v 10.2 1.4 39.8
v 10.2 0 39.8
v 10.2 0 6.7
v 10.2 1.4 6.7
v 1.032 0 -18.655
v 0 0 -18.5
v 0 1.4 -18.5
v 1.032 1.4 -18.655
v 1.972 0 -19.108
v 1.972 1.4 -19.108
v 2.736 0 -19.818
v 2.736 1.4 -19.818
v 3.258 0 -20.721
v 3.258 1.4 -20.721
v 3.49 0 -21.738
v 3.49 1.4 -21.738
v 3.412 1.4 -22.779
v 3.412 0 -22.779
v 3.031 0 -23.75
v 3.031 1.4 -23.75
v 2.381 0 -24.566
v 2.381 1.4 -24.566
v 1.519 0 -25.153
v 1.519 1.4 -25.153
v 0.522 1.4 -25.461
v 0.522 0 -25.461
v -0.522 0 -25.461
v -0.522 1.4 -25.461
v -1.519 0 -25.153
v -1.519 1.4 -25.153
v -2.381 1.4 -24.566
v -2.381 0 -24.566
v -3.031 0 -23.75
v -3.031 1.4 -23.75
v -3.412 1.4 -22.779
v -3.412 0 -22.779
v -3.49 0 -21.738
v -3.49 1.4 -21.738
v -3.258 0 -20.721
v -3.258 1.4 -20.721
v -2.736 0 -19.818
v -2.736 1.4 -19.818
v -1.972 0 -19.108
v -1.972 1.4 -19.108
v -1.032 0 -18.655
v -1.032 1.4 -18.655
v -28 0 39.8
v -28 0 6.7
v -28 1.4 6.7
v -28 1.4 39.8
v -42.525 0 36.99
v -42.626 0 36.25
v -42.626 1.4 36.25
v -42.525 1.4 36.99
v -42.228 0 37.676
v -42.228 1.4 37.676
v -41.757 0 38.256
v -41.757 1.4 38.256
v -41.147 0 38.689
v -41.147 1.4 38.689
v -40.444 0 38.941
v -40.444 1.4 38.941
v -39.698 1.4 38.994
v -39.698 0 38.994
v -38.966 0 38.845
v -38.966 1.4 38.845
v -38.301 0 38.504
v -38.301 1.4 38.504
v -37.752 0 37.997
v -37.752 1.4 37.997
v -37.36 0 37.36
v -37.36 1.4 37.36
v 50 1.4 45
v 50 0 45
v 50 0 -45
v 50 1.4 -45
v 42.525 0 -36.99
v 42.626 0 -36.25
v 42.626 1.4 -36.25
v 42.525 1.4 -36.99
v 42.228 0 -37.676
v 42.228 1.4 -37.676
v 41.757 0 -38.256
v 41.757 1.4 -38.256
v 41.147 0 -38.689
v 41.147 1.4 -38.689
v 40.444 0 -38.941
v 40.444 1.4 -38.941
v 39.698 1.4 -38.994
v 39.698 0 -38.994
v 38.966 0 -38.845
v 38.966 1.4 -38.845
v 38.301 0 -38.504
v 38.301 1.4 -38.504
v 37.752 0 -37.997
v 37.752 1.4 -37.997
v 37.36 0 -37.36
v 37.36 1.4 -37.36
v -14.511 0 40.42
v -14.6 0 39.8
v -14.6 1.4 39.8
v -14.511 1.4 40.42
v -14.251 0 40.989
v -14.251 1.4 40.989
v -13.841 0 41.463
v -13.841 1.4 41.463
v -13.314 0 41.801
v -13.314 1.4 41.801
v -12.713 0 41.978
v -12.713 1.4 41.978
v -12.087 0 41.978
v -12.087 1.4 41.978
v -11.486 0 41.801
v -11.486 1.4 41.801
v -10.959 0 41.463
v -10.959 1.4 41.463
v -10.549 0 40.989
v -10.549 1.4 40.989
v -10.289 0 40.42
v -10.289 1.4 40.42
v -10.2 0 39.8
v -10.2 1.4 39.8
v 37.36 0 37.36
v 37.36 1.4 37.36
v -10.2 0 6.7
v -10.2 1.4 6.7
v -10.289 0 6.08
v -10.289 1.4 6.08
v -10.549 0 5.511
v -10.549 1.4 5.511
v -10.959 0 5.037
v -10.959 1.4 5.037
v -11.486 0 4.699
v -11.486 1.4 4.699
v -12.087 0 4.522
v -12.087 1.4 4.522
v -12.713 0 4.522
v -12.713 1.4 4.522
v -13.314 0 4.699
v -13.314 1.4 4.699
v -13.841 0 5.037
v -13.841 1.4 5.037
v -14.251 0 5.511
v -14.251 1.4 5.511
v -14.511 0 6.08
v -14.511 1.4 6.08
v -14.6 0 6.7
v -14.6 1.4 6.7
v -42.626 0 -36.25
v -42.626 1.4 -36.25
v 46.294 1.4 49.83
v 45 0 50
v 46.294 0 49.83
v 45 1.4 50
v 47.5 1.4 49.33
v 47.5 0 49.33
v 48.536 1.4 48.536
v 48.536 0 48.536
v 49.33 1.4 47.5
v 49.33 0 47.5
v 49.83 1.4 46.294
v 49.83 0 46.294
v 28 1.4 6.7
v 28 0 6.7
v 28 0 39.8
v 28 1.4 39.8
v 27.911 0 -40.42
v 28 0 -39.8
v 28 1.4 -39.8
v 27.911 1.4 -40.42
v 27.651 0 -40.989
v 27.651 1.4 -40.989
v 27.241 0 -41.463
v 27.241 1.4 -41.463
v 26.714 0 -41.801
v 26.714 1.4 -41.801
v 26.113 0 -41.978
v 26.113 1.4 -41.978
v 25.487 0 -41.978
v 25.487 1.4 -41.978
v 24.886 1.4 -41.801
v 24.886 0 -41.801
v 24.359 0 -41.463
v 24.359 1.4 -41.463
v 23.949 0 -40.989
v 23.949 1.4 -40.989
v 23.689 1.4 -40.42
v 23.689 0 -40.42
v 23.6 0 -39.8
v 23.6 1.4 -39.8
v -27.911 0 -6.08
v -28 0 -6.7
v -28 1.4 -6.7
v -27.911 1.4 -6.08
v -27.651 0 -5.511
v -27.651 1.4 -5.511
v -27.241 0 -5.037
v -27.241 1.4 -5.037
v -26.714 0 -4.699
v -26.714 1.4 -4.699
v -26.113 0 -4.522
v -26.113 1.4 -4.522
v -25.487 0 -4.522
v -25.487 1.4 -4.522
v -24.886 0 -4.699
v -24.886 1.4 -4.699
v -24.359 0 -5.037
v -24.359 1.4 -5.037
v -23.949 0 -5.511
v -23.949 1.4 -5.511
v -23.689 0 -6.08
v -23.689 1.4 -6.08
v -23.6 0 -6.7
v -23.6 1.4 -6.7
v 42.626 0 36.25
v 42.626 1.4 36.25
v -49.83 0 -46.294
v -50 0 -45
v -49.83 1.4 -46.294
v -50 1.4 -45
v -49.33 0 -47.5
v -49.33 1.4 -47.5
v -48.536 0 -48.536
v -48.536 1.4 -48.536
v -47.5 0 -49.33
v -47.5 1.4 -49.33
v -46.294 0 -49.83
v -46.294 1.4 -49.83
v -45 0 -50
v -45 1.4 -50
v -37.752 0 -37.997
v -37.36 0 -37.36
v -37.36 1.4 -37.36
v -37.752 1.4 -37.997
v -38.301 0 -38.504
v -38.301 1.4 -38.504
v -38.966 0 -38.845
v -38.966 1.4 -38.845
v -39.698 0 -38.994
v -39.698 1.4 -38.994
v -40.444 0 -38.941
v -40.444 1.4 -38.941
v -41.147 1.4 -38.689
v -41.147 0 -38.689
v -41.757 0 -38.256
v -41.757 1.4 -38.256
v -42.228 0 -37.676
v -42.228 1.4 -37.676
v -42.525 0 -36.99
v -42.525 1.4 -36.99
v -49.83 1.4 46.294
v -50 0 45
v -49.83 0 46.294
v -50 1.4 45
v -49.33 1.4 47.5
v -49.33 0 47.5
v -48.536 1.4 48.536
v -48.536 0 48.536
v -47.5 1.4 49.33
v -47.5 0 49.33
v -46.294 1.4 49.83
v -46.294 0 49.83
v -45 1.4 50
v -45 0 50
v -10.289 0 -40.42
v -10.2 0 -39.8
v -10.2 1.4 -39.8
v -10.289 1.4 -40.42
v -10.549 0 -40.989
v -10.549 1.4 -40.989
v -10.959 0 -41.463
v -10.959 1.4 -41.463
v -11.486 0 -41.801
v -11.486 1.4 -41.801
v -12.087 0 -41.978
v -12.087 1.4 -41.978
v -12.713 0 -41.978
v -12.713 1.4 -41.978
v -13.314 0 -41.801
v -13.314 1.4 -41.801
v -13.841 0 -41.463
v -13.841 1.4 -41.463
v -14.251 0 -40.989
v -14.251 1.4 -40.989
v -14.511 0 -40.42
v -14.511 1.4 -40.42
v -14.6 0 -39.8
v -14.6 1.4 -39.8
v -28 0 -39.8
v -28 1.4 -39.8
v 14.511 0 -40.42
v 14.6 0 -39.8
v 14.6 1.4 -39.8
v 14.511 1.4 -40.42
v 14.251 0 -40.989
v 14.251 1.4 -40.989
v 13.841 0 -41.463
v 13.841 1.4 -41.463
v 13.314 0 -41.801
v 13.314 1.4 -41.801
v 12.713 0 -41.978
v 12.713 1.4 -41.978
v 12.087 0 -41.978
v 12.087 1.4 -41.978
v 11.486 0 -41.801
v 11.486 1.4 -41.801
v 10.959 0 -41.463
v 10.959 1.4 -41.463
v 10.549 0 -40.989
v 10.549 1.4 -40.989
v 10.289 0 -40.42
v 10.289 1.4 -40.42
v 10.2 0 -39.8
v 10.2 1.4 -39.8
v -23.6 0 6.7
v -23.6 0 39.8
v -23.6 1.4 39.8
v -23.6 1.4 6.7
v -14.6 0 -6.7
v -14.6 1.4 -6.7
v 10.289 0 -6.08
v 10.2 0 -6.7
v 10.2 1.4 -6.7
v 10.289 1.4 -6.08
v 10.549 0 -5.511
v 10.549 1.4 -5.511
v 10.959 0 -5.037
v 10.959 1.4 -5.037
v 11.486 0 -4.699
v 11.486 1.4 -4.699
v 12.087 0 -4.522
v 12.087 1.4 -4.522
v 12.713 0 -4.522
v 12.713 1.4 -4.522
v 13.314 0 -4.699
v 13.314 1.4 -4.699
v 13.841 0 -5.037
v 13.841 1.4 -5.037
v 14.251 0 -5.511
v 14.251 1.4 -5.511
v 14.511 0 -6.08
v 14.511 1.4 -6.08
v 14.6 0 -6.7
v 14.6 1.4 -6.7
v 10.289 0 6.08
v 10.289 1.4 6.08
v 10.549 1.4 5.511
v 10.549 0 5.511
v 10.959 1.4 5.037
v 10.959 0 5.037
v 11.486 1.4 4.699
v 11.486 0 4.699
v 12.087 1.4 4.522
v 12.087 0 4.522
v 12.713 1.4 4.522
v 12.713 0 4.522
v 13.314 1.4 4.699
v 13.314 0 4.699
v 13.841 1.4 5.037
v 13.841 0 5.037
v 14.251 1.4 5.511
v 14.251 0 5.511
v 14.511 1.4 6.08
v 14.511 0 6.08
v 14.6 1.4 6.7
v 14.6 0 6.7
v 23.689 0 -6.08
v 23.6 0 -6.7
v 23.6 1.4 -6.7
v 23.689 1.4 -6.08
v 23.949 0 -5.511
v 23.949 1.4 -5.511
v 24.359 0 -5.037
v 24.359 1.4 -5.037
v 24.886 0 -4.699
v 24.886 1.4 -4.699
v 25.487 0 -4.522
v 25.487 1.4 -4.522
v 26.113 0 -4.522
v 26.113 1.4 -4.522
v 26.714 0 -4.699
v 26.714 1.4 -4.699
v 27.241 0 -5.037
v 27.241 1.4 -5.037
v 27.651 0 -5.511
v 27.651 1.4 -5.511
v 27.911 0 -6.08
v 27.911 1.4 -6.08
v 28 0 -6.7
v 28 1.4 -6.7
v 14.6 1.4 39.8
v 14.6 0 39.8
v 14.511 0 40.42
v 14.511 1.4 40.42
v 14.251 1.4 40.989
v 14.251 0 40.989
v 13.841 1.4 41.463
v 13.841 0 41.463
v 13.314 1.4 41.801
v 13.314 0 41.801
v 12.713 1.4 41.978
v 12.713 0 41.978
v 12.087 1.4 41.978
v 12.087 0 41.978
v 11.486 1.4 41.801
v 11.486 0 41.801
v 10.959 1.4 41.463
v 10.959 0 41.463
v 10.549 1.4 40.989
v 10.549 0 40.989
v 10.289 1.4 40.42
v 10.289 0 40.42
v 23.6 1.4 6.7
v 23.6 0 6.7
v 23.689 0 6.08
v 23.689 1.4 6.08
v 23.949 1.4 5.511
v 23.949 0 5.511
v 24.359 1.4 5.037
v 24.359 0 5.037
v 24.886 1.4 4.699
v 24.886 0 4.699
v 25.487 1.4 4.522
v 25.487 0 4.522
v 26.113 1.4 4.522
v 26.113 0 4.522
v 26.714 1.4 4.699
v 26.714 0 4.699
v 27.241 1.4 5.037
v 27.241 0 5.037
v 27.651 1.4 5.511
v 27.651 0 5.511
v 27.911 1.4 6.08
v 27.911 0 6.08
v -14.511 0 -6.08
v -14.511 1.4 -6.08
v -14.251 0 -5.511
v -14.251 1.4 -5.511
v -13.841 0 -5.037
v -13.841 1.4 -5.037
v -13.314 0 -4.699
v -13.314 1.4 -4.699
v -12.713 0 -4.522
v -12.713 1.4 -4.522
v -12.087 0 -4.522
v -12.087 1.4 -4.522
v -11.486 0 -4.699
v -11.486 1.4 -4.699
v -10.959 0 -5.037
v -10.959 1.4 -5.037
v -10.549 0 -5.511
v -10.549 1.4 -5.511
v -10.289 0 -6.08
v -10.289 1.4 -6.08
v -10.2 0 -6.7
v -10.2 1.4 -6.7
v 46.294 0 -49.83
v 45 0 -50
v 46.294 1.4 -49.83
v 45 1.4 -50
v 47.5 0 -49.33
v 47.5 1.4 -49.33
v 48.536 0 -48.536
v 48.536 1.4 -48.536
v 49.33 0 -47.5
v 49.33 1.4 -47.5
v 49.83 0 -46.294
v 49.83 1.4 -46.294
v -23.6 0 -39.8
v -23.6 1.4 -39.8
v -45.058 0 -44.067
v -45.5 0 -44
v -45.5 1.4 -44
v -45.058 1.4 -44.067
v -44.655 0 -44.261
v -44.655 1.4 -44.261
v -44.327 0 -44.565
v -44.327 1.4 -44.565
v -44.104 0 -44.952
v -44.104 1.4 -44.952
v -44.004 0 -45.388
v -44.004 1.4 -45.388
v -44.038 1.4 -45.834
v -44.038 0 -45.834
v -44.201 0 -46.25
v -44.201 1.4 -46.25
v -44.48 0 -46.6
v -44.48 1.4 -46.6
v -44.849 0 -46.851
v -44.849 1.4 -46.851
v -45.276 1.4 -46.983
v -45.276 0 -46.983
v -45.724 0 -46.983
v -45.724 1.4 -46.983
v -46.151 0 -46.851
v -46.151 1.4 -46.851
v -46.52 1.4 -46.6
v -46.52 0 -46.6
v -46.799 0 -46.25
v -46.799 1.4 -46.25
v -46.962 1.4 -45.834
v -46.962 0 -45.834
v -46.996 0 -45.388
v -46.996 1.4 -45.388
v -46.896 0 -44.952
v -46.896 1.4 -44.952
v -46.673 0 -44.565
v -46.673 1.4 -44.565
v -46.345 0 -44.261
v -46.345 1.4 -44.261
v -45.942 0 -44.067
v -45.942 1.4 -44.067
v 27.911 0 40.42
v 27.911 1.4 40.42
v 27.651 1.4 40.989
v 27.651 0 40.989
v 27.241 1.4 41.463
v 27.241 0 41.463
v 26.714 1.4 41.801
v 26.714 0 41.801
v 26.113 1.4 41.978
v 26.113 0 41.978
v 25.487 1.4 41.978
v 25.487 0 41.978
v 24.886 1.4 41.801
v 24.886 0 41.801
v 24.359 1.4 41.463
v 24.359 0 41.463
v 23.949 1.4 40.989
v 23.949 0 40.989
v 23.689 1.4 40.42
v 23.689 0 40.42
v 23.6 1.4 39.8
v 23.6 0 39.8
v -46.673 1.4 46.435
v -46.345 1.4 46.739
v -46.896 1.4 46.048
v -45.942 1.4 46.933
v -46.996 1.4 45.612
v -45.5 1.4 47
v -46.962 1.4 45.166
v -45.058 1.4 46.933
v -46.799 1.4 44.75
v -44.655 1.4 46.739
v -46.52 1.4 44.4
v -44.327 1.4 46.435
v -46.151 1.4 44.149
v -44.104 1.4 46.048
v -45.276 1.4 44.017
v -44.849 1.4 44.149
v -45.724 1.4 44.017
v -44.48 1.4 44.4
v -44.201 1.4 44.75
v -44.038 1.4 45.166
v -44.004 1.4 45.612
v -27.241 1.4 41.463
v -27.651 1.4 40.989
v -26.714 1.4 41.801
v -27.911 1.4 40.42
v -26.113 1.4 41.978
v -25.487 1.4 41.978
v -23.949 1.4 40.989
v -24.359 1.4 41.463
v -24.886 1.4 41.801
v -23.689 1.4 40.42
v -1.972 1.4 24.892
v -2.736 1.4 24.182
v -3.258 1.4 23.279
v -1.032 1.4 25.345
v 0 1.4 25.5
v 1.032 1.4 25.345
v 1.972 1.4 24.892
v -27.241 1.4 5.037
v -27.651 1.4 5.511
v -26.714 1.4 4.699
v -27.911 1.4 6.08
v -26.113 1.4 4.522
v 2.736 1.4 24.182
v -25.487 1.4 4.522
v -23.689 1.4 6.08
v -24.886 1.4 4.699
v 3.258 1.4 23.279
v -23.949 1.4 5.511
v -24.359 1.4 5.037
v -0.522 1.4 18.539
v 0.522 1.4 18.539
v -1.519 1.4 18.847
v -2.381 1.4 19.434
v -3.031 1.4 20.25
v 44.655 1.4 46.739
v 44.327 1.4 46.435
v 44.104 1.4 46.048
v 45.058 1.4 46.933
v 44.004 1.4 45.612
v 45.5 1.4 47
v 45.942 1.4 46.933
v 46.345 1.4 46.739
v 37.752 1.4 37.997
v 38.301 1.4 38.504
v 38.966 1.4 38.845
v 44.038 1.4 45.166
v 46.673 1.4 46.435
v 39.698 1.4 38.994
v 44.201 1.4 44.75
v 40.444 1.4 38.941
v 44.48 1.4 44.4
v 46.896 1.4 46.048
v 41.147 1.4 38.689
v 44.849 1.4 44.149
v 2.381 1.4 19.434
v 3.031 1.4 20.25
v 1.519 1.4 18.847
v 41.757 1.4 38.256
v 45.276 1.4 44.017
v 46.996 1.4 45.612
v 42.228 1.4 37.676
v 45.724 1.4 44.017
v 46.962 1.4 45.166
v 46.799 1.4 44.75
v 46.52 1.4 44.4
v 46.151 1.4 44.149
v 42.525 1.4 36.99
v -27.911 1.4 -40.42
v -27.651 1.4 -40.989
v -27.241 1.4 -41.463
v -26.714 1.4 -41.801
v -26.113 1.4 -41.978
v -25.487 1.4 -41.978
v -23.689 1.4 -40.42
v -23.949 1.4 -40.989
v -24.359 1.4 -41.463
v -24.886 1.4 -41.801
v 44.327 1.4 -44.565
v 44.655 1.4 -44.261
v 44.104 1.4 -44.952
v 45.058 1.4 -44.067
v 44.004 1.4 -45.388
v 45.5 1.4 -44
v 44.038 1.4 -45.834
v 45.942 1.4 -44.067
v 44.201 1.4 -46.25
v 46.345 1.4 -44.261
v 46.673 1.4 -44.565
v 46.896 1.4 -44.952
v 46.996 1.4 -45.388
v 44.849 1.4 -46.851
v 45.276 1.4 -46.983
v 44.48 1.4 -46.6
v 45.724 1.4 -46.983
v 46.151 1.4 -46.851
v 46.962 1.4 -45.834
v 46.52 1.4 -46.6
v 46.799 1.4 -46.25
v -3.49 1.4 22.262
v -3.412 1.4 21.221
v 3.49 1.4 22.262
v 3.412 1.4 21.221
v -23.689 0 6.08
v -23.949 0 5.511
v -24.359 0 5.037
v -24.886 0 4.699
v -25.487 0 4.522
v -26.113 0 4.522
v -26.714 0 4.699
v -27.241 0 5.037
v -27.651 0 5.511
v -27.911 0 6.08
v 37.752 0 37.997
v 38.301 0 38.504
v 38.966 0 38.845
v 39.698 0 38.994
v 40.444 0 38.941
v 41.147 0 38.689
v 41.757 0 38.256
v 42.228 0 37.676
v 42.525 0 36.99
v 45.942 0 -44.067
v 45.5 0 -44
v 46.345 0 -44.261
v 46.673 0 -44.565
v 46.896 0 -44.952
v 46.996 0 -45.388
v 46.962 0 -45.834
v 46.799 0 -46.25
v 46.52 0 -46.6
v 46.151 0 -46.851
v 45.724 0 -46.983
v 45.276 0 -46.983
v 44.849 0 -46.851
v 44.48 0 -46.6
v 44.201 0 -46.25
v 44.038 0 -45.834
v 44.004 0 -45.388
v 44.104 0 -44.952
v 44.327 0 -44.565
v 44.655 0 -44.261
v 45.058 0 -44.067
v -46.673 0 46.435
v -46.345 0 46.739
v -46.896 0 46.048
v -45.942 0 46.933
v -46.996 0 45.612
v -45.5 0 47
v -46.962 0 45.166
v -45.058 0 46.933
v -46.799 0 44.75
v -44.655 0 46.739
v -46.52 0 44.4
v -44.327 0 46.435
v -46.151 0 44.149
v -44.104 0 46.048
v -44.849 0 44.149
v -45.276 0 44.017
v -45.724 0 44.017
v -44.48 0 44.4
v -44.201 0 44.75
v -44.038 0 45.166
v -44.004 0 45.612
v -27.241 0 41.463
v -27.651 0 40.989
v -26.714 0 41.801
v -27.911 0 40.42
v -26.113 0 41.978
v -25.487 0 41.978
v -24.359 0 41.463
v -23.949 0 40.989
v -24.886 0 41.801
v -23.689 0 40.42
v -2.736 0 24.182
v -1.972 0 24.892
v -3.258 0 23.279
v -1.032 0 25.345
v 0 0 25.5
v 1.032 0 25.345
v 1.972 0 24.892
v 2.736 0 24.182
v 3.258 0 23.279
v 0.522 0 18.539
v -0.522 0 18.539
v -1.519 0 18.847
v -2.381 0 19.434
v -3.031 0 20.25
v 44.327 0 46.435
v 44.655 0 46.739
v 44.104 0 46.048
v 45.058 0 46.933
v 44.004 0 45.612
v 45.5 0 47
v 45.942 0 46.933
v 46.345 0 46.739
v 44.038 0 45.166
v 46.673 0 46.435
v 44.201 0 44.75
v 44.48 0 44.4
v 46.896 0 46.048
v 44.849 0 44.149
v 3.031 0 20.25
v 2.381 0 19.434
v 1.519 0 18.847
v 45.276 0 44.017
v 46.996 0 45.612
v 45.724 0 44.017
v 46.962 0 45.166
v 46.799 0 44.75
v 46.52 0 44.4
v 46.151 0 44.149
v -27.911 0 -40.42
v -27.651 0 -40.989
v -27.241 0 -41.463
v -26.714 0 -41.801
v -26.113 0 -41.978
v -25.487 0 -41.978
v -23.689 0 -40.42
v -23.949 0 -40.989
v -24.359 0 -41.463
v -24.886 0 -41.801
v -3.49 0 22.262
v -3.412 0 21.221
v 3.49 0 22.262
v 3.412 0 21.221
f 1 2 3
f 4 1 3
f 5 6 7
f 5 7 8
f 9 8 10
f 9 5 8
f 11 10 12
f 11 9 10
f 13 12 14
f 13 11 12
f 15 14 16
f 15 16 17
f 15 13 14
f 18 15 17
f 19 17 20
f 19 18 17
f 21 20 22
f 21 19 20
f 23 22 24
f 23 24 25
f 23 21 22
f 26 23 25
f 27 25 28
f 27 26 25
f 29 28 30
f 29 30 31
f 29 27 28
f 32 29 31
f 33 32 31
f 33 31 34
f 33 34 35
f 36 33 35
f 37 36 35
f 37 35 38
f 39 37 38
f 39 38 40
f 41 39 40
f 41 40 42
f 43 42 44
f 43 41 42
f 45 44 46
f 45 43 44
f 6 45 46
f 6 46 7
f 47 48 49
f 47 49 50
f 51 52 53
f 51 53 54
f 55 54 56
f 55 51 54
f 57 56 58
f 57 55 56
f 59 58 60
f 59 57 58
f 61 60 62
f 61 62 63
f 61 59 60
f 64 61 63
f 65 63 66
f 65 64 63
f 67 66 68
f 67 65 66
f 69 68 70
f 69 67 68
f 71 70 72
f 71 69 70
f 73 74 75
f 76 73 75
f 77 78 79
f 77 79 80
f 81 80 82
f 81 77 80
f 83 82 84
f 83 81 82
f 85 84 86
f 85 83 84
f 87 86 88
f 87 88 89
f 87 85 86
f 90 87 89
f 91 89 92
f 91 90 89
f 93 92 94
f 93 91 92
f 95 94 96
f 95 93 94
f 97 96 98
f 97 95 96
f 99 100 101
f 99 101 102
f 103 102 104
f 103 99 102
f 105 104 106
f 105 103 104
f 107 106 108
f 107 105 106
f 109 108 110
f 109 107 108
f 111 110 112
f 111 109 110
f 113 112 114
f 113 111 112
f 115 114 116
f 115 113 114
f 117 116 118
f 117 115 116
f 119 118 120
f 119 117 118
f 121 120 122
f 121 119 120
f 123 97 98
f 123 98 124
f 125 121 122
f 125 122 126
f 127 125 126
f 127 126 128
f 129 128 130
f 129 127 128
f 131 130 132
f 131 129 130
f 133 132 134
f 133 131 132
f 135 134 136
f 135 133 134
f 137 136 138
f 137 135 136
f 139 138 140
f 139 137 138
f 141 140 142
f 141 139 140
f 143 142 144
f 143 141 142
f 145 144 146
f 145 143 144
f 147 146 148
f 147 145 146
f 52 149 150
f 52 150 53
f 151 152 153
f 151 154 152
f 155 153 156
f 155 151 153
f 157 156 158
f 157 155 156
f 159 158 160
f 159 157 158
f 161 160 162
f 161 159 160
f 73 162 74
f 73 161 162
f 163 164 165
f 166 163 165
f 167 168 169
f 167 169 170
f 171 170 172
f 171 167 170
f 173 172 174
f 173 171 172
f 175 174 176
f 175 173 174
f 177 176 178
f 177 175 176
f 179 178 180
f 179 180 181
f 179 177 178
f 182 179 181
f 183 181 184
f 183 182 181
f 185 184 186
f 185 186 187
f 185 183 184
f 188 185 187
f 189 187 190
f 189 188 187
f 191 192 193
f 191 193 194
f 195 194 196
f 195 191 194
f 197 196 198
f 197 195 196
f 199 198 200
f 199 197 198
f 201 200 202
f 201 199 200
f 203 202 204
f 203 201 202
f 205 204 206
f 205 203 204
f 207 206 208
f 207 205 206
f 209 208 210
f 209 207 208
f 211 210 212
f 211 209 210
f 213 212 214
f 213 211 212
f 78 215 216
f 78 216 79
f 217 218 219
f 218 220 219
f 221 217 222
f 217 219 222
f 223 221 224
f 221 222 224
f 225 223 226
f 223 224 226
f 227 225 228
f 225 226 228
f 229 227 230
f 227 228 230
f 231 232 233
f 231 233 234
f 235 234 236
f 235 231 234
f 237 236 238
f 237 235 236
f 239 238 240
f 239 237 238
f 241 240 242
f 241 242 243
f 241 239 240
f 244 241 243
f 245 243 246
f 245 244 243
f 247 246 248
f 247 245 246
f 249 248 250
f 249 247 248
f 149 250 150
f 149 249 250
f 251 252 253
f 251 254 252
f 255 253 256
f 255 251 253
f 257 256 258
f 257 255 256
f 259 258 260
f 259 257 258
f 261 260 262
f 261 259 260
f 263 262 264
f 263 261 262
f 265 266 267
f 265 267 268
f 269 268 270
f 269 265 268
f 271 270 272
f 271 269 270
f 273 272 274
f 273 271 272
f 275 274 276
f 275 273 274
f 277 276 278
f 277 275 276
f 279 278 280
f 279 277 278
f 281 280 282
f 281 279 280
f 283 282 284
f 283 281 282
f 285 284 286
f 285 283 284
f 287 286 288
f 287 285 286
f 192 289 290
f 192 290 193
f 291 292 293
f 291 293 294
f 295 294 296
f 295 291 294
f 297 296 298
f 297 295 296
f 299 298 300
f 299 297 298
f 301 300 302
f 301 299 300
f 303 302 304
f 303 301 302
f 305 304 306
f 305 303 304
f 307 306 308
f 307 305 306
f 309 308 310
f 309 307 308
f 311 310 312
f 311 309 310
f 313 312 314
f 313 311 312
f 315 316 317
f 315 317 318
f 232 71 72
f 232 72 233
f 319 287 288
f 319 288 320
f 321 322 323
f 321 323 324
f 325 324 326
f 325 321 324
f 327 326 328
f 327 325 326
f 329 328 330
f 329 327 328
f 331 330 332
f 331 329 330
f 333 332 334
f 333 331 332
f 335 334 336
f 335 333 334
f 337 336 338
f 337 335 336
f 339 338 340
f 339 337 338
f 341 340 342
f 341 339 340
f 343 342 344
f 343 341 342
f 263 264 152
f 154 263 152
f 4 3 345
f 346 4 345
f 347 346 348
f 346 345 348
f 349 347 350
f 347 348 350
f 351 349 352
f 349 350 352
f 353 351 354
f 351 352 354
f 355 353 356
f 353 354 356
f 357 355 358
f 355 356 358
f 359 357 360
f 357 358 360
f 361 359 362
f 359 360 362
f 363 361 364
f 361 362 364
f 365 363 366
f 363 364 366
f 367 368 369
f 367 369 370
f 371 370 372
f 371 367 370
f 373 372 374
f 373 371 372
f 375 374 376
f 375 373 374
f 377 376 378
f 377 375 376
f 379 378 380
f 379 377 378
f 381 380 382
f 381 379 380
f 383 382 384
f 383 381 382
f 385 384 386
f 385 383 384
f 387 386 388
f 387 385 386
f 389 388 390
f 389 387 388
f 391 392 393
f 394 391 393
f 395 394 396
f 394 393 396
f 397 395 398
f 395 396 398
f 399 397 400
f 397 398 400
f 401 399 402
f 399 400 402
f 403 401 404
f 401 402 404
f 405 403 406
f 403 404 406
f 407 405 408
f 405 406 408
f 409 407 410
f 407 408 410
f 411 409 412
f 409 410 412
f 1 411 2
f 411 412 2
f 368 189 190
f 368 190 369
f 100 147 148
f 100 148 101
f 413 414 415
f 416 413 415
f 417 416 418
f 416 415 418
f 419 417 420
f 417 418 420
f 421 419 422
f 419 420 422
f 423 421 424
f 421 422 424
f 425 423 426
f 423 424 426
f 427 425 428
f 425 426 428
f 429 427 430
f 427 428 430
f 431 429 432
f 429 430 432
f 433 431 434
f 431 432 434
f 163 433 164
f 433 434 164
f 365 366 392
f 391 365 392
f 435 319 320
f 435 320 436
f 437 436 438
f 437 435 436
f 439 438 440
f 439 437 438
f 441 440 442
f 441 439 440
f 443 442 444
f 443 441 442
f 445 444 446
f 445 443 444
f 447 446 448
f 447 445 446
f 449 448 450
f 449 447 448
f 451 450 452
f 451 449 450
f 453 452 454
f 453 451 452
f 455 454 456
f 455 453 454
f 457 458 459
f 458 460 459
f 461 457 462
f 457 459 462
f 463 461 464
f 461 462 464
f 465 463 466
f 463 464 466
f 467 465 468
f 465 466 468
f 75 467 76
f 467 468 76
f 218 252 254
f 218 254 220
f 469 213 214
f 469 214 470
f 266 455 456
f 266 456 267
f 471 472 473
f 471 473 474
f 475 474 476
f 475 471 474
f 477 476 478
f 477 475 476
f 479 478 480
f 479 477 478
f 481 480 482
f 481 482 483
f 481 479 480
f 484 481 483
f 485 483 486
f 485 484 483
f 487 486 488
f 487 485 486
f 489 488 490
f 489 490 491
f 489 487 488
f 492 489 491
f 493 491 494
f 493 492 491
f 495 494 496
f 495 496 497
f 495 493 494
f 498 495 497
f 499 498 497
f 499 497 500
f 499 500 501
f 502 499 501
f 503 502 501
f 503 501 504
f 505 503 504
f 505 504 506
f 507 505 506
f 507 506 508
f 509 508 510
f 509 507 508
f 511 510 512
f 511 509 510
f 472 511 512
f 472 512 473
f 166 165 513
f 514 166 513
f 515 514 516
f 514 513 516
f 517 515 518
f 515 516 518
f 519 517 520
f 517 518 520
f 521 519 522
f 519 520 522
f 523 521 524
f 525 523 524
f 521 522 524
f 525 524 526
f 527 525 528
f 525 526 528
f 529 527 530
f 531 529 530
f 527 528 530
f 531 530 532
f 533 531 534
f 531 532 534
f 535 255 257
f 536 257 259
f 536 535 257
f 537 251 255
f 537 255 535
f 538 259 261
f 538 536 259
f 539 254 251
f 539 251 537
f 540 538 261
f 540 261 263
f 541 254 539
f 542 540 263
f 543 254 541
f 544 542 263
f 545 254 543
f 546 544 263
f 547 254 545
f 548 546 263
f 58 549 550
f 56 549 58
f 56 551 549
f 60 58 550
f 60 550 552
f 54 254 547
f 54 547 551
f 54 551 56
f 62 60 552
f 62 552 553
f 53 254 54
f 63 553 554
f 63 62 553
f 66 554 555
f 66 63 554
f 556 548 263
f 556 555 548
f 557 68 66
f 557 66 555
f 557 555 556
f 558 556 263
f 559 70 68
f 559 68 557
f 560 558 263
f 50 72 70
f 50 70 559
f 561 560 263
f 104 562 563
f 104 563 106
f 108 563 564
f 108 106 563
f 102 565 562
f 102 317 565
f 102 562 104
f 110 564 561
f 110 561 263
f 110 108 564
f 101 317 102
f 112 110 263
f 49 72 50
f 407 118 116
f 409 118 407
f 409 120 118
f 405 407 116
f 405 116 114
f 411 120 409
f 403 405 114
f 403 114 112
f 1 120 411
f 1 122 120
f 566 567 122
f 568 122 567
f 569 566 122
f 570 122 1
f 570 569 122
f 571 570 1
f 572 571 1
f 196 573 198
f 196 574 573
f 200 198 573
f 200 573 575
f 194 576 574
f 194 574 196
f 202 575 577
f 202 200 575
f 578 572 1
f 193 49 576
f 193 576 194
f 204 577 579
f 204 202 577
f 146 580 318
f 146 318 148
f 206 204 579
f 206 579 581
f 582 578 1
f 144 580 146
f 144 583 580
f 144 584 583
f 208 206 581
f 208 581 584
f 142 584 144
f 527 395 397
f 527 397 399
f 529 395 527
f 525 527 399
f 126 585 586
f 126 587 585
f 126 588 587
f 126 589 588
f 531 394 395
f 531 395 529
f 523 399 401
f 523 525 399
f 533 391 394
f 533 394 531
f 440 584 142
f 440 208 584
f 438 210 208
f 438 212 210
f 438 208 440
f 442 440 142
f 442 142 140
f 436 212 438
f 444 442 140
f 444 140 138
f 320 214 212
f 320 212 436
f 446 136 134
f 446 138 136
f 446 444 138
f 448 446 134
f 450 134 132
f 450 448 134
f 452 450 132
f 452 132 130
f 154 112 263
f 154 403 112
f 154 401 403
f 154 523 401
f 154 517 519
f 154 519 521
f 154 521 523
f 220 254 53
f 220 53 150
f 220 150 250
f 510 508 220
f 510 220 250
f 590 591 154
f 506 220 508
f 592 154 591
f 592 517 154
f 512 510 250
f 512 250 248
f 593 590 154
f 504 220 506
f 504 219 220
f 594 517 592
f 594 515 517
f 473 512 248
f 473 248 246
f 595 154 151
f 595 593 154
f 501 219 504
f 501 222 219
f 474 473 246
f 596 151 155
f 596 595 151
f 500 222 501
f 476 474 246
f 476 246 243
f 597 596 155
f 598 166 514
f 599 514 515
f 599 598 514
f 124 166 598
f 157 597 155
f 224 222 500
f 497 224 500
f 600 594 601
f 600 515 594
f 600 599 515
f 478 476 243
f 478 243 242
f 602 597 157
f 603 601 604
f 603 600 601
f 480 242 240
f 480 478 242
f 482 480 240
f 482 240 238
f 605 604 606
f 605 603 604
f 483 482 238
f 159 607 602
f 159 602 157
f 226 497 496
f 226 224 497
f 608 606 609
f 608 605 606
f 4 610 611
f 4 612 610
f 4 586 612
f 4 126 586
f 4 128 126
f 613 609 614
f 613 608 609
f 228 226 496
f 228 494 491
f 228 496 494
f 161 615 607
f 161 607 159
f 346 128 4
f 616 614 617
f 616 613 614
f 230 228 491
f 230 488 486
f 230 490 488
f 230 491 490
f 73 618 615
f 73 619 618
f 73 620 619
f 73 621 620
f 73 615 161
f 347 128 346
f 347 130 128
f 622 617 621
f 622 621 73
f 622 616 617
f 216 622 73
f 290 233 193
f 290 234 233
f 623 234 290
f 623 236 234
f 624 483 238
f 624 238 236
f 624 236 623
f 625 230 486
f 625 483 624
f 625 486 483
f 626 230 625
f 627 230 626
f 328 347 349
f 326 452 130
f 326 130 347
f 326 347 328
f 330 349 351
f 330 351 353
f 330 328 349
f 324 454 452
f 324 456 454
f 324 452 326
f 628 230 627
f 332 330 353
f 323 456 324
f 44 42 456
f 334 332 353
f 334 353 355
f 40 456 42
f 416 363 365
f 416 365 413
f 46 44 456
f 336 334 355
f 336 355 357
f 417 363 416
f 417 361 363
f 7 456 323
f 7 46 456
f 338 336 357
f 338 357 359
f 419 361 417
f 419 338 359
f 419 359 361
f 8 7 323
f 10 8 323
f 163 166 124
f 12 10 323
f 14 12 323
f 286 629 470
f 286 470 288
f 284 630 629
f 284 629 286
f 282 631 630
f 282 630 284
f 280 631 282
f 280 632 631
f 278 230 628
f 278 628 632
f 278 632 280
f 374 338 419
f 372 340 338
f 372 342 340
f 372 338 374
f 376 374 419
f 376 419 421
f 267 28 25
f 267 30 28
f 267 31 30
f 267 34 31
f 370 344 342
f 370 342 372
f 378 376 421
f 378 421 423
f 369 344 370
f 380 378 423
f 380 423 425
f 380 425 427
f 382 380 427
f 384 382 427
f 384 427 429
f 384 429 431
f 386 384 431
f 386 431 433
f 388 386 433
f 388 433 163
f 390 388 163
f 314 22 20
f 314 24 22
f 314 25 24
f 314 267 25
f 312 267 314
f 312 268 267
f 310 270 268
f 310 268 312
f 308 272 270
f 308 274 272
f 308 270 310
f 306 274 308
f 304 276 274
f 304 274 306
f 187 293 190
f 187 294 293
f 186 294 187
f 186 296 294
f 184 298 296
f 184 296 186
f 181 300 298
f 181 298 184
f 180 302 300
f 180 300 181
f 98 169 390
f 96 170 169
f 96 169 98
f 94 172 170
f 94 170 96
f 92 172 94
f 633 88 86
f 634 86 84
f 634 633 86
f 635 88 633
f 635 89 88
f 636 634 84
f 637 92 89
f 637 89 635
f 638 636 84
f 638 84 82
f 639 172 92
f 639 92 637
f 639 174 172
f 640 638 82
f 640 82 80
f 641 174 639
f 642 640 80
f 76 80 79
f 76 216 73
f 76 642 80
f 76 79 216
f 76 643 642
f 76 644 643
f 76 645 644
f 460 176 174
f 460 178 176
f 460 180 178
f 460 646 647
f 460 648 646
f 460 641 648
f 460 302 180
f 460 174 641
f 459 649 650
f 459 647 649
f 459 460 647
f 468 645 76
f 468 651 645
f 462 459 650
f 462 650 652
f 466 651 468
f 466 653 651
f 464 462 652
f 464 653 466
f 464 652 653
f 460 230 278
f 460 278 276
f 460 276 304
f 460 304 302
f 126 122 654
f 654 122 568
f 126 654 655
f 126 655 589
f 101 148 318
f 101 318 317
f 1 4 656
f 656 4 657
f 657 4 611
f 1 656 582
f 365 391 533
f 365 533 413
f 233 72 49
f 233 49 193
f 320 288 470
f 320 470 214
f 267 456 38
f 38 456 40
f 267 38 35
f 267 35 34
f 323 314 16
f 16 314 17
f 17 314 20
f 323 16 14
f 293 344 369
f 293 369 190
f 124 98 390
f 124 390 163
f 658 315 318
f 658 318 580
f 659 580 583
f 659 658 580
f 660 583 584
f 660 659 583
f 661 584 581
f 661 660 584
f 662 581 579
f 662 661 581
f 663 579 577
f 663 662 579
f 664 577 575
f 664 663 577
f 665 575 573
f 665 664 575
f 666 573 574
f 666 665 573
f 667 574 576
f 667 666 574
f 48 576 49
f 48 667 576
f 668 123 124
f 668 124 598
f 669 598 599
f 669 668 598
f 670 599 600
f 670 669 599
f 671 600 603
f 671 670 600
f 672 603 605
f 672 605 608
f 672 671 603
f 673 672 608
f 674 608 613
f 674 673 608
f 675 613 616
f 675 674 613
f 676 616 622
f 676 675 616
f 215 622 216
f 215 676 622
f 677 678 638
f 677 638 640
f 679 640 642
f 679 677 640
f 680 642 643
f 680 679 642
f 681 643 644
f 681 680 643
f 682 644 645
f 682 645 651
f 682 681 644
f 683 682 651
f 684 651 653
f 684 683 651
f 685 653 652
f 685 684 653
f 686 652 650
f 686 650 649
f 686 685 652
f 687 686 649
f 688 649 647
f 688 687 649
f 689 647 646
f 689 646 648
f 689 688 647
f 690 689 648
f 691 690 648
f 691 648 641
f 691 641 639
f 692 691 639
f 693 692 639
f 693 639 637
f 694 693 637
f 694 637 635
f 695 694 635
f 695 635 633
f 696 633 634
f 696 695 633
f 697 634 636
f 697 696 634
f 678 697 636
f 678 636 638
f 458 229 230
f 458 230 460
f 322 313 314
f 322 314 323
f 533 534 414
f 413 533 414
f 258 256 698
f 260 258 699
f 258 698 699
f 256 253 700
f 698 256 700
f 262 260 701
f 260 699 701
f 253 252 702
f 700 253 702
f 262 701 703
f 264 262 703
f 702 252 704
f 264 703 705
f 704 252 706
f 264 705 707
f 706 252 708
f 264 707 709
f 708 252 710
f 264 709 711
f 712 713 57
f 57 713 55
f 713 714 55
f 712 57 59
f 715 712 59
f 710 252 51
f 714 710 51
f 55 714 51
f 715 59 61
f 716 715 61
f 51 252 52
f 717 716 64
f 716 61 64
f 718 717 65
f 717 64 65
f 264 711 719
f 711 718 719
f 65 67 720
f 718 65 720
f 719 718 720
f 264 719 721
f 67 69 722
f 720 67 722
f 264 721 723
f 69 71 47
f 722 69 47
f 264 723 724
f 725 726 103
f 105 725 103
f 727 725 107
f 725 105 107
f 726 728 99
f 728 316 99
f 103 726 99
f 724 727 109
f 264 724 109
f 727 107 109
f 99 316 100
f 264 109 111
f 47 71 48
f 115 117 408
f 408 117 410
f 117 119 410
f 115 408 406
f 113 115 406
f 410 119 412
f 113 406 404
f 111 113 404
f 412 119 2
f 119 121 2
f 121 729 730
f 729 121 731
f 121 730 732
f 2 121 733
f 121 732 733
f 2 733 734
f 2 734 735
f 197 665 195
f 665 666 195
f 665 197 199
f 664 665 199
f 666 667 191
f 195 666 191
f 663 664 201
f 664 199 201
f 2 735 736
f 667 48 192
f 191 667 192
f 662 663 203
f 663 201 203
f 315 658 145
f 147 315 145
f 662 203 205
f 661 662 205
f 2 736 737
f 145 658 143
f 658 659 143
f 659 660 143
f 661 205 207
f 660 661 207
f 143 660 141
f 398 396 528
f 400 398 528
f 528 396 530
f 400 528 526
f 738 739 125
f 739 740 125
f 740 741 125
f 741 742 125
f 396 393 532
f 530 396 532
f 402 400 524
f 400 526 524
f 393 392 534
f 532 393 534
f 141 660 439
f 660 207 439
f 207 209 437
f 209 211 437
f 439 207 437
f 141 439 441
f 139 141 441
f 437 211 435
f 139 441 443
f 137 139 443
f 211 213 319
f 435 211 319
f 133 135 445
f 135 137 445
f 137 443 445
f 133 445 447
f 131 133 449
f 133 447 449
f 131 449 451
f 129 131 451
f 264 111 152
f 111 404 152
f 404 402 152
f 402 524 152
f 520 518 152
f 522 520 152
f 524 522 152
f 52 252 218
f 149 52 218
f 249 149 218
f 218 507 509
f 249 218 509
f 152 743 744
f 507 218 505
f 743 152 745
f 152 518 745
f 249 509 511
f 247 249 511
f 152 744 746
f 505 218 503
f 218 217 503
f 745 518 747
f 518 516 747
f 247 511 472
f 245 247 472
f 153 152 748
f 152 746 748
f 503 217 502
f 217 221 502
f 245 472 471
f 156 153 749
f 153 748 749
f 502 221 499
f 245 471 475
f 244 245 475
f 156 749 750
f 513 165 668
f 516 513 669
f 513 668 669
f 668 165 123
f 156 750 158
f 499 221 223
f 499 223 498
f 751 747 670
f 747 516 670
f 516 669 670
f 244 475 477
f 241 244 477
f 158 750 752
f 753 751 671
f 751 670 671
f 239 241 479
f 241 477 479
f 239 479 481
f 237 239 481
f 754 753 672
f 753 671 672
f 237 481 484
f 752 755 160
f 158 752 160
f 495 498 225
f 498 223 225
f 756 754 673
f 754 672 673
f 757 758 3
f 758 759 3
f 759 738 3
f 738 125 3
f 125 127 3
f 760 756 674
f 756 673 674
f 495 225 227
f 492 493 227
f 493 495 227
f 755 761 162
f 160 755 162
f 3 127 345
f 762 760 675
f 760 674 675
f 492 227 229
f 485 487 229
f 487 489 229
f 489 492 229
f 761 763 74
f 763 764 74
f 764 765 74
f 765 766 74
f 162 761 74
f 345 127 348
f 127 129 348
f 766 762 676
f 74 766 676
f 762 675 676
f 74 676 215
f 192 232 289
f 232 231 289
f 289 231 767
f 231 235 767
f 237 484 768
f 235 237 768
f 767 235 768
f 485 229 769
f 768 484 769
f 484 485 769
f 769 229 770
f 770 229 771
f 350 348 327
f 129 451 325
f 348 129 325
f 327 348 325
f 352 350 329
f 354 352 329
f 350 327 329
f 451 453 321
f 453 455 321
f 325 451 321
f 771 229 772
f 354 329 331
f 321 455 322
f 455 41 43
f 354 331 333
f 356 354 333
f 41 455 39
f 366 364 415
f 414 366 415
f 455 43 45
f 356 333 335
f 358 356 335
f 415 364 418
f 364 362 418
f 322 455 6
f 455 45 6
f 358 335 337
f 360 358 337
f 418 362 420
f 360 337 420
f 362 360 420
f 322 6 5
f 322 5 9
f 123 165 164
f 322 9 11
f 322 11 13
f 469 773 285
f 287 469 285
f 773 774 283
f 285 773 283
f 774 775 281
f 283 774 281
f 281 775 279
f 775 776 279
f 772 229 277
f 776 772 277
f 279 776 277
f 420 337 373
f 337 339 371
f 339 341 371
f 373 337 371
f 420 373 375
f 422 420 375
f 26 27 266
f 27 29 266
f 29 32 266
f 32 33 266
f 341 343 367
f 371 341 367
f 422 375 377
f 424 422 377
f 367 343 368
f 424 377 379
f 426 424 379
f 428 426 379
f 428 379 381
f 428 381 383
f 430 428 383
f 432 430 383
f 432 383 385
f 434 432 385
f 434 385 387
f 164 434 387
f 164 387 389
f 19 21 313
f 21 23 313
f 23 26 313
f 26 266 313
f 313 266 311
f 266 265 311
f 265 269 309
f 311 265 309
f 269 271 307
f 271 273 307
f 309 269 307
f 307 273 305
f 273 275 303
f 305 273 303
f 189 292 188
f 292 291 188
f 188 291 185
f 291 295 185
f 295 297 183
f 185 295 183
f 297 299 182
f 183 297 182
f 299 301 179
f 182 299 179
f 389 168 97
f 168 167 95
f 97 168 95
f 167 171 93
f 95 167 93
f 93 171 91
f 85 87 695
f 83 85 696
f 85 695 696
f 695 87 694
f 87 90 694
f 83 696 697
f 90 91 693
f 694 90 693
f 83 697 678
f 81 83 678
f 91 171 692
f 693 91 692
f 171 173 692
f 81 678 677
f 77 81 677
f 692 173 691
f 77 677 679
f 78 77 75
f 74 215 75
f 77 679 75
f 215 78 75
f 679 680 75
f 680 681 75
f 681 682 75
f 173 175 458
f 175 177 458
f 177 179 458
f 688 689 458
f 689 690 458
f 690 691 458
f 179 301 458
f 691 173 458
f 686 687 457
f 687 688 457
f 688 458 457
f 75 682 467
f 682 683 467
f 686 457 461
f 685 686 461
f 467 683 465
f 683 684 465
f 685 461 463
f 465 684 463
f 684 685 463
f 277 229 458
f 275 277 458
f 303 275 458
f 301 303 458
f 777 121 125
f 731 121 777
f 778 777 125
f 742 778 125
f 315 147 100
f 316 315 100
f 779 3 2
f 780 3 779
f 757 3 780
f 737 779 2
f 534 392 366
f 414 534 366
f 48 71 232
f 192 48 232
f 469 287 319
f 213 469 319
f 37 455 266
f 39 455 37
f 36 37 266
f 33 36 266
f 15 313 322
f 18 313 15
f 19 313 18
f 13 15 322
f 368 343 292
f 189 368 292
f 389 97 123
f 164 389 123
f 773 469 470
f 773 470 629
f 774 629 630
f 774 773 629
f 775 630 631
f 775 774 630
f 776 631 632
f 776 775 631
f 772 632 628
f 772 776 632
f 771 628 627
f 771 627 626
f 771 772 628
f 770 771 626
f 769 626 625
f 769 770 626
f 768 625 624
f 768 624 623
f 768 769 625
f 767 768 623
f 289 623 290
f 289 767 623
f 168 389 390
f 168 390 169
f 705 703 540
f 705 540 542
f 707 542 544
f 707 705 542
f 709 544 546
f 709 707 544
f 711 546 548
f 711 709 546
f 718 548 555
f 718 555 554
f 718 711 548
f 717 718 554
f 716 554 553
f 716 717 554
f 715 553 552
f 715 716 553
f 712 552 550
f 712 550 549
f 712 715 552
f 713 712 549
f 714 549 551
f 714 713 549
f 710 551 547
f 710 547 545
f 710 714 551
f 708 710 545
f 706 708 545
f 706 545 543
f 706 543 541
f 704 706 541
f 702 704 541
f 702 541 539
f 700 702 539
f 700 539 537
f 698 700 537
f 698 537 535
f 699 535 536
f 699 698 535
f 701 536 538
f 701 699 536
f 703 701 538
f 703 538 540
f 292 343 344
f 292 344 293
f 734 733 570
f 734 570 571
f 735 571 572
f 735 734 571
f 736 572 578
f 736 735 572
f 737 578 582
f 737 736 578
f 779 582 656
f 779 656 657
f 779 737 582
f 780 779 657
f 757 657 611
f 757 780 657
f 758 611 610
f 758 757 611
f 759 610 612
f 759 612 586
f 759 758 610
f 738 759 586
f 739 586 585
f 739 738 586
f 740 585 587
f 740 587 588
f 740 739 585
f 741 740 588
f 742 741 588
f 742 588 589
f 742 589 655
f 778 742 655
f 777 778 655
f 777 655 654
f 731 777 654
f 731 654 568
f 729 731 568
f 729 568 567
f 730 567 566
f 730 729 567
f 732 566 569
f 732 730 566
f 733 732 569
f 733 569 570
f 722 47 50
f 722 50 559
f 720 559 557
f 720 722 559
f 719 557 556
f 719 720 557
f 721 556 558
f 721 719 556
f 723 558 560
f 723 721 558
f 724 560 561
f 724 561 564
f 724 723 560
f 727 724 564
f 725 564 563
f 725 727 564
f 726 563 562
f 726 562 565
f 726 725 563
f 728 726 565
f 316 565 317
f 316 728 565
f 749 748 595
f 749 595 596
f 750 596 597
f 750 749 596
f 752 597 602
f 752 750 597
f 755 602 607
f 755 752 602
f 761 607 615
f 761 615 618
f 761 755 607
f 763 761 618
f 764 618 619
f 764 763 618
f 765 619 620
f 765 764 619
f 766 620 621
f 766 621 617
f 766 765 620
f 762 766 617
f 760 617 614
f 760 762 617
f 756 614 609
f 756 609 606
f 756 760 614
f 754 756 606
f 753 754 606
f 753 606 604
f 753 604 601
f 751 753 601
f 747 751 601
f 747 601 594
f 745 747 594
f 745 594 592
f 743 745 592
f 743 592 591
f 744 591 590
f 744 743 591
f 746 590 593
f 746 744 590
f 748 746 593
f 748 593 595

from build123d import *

# Parameters (mm, degrees)
SKETCH1_W           = 100
SKETCH1_H           = 100
SKETCH1_R           = 1.5
SKETCH1_R_2         = 3.5
BOSS_EXTRUDE1_DEPTH = 1.4
FILLET1_R           = 5


with BuildPart() as part:
    # Sketch1 → Boss-Extrude1 (new body)
    with BuildSketch(Plane(origin=(0, 0, 0), x_dir=(1, 0, 0), z_dir=(0, 1, 0))):
        Rectangle(SKETCH1_W, SKETCH1_H)
        with Locations(Location((-45.5, 45.5, 0), (0, 0, 270))):
            Circle(SKETCH1_R, mode=Mode.SUBTRACT)
        with Locations(Location((45.5, 45.5, 0), (0, 0, 270))):
            Circle(SKETCH1_R, mode=Mode.SUBTRACT)
        with Locations(Location((-45.5, -45.5, 0), (0, 0, 270))):
            Circle(SKETCH1_R, mode=Mode.SUBTRACT)
        with Locations(Location((45.5, -45.5, 0), (0, 0, 270))):
            Circle(SKETCH1_R, mode=Mode.SUBTRACT)
        with Locations(Location((0, 22, 0), (0, 0, 270))):
            Circle(SKETCH1_R_2, mode=Mode.SUBTRACT)
        with Locations(Location((0, -22, 0), (0, 0, 270))):
            Circle(SKETCH1_R_2, mode=Mode.SUBTRACT)
        with BuildLine():
            Line((-42.626255843, 36.25), (-42.626255843, -36.25))
            ThreePointArc((-42.626255843, -36.25), (-40.443668748, -38.940825635), (-37.360406683, -37.360406683))
            Line((-37.360406683, -37.360406683), (-37.360406683, 37.360406683))
            ThreePointArc((-37.360406683, 37.360406683), (-40.443668748, 38.940825635), (-42.626255843, 36.25))
        make_face(mode=Mode.SUBTRACT)
        with BuildLine():
            Line((-28, 39.8), (-28, 6.7))
            ThreePointArc((-28, 6.7), (-25.8, 4.5), (-23.6, 6.7))
            Line((-23.6, 6.7), (-23.6, 39.8))
            ThreePointArc((-23.6, 39.8), (-25.8, 42), (-28, 39.8))
        make_face(mode=Mode.SUBTRACT)
        with BuildLine():
            Line((-14.6, 39.8), (-14.6, 6.7))
            ThreePointArc((-14.6, 6.7), (-12.4, 4.5), (-10.2, 6.7))
            Line((-10.2, 6.7), (-10.2, 39.8))
            ThreePointArc((-10.2, 39.8), (-12.4, 42), (-14.6, 39.8))
        make_face(mode=Mode.SUBTRACT)
        with BuildLine():
            Line((-10.2, -39.8), (-10.2, -6.7))
            ThreePointArc((-10.2, -6.7), (-12.4, -4.5), (-14.6, -6.7))
            Line((-14.6, -6.7), (-14.6, -39.8))
            ThreePointArc((-14.6, -39.8), (-12.4, -42), (-10.2, -39.8))
        make_face(mode=Mode.SUBTRACT)
        with BuildLine():
            Line((-23.6, -39.8), (-23.6, -6.7))
            ThreePointArc((-23.6, -6.7), (-25.8, -4.5), (-28, -6.7))
            Line((-28, -6.7), (-28, -39.8))
            ThreePointArc((-28, -39.8), (-25.8, -42), (-23.6, -39.8))
        make_face(mode=Mode.SUBTRACT)
        with BuildLine():
            Line((10.2, -39.8), (10.2, -6.7))
            ThreePointArc((10.2, -6.7), (12.4, -4.5), (14.6, -6.7))
            Line((14.6, -6.7), (14.6, -39.8))
            ThreePointArc((14.6, -39.8), (12.4, -42), (10.2, -39.8))
        make_face(mode=Mode.SUBTRACT)
        with BuildLine():
            Line((10.2, 39.8), (10.2, 6.7))
            ThreePointArc((10.2, 6.7), (12.4, 4.5), (14.6, 6.7))
            Line((14.6, 6.7), (14.6, 39.8))
            ThreePointArc((14.6, 39.8), (12.4, 42), (10.2, 39.8))
        make_face(mode=Mode.SUBTRACT)
        with BuildLine():
            Line((23.6, -39.8), (23.6, -6.7))
            ThreePointArc((23.6, -6.7), (25.8, -4.5), (28, -6.7))
            Line((28, -6.7), (28, -39.8))
            ThreePointArc((28, -39.8), (25.8, -42), (23.6, -39.8))
        make_face(mode=Mode.SUBTRACT)
        with BuildLine():
            Line((23.6, 39.8), (23.6, 6.7))
            ThreePointArc((23.6, 6.7), (25.8, 4.5), (28, 6.7))
            Line((28, 6.7), (28, 39.8))
            ThreePointArc((28, 39.8), (25.8, 42), (23.6, 39.8))
        make_face(mode=Mode.SUBTRACT)
        with BuildLine():
            Line((37.360406683, 37.360406683), (37.360406683, -37.360406683))
            ThreePointArc((37.360406683, -37.360406683), (40.443668748, -38.940825635), (42.626255843, -36.25))
            Line((42.626255843, -36.25), (42.626255843, 36.25))
            ThreePointArc((42.626255843, 36.25), (40.443668748, 38.940825635), (37.360406683, 37.360406683))
        make_face(mode=Mode.SUBTRACT)
    extrude(amount=BOSS_EXTRUDE1_DEPTH)

    # Fillet1
    fillet1_edges = [part.edges().sort_by_distance(p)[0] for p in [
        (-50, 0.7, -50),
        (50, 0.7, -50),
        (50, 0.7, 50),
        (-50, 0.7, 50),
    ]]
    fillet(fillet1_edges, radius=FILLET1_R)


solid = part.part
